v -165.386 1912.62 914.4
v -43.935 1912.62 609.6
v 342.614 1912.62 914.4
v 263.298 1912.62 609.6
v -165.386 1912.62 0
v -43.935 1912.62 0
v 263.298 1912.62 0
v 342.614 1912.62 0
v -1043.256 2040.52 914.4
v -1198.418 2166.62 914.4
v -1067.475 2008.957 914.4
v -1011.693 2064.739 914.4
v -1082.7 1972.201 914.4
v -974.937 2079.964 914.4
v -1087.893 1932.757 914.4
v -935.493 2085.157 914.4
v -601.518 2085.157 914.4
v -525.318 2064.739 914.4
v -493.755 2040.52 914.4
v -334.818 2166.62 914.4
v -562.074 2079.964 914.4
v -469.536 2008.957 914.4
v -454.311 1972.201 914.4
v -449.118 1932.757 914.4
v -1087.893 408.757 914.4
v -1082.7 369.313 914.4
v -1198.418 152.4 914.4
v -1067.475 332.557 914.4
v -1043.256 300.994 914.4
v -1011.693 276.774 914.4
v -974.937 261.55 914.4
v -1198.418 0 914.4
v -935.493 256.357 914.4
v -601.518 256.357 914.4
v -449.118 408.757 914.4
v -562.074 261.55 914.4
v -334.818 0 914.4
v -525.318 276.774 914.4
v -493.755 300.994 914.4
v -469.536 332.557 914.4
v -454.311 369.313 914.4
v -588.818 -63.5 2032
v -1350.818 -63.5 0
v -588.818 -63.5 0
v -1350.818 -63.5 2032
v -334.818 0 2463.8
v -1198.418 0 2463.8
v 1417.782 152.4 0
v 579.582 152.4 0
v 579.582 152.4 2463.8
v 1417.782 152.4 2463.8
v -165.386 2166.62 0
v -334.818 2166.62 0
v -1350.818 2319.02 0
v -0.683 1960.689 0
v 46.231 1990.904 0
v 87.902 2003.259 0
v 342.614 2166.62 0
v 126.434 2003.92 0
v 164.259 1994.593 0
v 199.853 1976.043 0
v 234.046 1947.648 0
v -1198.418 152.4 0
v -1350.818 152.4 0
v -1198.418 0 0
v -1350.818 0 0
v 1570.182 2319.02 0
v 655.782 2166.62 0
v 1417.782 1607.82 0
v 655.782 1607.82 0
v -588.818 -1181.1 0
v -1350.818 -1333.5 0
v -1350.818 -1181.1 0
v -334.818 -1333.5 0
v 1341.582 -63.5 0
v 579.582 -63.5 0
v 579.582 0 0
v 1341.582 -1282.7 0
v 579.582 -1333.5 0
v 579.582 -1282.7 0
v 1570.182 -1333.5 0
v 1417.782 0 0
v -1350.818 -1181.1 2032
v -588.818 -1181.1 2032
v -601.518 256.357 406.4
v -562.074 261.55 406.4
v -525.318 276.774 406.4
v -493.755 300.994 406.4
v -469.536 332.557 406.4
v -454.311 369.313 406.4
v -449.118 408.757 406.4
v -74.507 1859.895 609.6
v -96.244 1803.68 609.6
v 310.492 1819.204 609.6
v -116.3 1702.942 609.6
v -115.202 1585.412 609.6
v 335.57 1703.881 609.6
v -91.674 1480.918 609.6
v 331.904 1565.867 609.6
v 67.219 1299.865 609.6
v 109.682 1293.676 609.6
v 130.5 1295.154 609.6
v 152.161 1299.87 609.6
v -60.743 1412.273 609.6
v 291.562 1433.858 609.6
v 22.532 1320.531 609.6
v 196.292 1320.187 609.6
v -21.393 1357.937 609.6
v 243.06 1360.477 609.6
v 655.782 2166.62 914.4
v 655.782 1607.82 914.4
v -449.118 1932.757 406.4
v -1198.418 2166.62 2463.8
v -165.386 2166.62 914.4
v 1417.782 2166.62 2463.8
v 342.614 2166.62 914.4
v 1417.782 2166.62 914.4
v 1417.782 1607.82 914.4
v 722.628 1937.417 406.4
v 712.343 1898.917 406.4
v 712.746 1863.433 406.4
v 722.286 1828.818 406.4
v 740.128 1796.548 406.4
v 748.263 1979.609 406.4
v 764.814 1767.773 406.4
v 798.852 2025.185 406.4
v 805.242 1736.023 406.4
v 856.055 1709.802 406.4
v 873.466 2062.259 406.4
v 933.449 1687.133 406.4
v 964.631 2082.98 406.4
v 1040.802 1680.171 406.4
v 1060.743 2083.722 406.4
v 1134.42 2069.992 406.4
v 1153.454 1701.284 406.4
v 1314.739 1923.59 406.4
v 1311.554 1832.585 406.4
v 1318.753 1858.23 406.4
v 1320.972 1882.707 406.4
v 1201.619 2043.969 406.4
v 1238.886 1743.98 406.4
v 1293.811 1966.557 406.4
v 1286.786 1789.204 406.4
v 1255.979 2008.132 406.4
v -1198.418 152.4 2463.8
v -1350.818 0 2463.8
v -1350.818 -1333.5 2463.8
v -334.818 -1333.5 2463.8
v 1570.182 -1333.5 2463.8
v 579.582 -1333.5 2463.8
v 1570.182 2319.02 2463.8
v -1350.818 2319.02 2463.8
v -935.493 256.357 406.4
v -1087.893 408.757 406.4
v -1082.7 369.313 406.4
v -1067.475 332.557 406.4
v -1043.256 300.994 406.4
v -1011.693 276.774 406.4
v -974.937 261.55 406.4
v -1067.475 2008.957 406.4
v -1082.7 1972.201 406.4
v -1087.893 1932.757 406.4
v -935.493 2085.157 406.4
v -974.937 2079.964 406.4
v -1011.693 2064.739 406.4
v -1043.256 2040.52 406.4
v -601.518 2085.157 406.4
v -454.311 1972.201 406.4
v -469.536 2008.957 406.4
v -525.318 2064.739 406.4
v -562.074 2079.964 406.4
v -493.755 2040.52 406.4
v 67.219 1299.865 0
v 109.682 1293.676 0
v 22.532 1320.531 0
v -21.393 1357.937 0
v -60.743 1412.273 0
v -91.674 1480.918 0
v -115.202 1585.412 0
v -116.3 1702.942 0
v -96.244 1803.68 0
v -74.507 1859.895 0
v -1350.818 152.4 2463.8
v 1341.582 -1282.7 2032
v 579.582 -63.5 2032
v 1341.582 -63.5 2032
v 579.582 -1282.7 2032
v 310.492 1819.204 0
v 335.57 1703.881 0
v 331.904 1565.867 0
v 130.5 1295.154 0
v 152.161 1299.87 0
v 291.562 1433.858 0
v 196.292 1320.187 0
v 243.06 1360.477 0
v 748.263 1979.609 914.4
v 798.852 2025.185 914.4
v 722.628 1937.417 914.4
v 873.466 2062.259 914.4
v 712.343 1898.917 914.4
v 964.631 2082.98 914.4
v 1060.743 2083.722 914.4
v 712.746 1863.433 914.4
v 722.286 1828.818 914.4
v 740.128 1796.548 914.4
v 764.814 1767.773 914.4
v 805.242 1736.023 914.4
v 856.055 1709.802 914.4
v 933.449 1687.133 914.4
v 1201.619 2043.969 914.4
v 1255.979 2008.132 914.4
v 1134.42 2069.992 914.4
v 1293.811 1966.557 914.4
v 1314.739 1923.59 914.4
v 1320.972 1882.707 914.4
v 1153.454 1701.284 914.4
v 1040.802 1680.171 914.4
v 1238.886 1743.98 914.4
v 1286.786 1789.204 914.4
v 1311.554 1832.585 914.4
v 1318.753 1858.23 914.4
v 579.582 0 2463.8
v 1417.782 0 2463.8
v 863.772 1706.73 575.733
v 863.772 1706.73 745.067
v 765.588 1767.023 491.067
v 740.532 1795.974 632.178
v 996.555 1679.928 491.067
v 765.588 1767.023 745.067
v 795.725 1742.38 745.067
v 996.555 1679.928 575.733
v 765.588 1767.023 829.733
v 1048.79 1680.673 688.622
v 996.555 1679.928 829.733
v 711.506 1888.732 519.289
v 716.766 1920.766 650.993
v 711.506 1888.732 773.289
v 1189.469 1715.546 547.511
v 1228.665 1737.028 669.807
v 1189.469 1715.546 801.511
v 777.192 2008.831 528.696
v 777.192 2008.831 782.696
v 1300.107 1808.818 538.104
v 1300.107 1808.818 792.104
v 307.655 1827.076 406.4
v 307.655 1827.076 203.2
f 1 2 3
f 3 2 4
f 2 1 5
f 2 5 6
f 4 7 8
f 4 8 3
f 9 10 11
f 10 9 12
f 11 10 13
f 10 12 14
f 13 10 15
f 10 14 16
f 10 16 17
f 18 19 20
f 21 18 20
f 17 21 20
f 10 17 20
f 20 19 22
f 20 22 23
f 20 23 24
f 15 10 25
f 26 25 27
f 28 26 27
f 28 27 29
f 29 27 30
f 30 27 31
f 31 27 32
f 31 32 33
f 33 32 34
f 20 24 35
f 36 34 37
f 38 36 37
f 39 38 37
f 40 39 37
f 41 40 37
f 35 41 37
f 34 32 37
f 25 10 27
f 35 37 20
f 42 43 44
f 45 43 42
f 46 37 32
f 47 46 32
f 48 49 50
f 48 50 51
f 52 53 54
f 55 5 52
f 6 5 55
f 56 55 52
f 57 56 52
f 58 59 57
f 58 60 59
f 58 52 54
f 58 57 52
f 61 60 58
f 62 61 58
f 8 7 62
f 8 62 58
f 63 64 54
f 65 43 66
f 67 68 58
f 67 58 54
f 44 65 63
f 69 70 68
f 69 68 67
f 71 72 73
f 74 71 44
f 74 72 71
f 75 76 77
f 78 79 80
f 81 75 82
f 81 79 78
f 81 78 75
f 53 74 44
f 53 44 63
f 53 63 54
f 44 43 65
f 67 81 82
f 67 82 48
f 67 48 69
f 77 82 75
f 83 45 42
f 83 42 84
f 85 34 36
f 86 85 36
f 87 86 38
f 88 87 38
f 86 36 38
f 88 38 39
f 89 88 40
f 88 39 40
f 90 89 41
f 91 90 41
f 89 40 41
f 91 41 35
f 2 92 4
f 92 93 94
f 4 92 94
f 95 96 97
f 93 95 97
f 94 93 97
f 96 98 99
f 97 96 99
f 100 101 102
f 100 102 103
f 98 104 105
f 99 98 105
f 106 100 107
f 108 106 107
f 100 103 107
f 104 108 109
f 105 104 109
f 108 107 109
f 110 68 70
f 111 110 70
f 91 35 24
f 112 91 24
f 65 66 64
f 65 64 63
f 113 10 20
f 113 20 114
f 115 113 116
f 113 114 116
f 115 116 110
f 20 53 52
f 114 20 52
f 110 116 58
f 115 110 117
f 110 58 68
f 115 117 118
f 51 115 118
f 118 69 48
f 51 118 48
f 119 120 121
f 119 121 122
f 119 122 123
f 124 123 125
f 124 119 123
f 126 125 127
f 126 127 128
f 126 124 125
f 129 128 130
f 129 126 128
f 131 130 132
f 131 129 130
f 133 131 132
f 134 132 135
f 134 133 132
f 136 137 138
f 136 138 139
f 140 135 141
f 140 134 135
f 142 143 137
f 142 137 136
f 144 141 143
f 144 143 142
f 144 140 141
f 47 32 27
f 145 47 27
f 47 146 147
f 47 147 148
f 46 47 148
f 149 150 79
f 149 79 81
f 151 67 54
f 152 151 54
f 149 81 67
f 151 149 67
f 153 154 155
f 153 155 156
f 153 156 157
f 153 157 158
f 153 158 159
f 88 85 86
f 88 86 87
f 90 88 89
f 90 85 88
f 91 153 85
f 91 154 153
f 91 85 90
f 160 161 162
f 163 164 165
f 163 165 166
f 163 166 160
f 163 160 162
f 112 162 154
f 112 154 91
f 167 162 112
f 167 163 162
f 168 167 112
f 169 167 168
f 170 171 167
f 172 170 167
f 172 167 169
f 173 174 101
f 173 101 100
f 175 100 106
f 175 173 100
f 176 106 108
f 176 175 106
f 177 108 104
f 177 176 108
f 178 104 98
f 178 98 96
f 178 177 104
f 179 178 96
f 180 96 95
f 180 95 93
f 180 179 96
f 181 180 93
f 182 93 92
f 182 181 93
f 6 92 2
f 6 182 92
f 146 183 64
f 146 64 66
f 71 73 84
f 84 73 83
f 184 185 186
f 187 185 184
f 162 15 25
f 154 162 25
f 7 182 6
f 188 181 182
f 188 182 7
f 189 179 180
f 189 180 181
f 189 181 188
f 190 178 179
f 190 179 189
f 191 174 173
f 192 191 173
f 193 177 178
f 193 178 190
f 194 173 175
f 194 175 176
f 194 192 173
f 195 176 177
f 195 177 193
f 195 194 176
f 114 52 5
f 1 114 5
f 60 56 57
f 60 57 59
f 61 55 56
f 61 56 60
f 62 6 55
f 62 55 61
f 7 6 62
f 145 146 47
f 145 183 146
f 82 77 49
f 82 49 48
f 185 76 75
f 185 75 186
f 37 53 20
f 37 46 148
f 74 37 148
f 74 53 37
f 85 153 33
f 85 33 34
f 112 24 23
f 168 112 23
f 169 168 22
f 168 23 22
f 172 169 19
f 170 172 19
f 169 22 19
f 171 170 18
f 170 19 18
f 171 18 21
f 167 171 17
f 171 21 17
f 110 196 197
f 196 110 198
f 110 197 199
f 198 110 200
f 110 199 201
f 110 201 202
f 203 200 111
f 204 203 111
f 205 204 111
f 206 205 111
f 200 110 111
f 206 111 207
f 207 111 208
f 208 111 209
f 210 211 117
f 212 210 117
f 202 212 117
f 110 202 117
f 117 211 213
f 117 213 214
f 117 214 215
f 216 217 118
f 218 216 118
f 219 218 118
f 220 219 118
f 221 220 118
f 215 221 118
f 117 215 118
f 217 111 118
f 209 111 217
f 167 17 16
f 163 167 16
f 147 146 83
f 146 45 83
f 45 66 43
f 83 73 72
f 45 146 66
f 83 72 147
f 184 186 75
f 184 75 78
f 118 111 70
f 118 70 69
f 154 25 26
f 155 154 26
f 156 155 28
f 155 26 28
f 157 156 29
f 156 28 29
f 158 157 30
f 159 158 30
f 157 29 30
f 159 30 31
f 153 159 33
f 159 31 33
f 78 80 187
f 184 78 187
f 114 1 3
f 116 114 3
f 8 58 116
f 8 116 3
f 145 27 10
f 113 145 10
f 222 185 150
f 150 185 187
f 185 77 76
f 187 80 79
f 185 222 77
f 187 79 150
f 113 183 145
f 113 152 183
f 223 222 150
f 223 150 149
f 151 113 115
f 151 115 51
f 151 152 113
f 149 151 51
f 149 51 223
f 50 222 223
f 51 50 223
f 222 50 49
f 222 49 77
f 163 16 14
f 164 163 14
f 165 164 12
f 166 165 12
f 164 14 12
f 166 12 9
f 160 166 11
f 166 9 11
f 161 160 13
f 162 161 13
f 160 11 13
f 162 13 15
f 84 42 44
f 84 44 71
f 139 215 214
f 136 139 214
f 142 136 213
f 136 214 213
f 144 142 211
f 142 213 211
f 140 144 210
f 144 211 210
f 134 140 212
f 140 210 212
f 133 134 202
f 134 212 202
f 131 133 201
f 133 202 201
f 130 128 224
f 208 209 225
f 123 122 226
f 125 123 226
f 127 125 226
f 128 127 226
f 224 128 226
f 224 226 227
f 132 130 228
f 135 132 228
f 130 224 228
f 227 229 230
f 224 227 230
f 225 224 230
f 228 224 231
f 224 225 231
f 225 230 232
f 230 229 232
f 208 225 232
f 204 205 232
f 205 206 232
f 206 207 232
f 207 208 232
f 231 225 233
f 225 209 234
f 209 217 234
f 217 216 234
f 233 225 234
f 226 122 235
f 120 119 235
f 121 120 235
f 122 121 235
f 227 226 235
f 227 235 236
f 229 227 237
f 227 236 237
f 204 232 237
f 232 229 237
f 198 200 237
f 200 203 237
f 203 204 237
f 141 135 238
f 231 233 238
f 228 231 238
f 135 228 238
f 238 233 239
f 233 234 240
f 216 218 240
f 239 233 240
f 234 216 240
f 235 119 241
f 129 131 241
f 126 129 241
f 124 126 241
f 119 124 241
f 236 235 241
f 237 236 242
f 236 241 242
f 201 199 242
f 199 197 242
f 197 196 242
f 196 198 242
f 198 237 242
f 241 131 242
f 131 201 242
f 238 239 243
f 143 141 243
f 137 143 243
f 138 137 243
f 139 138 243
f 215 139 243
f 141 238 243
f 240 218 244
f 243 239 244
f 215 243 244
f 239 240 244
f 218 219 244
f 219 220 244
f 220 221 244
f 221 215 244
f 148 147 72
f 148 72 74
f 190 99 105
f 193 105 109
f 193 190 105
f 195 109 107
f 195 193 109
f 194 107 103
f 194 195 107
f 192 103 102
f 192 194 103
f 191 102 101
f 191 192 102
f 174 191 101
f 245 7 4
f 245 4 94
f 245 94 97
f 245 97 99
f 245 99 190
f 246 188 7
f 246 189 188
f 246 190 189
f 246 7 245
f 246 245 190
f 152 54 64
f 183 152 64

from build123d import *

# Parameters (mm, degrees)
F1_DEPTH  = 2463.8
F2_W      = 1117.6
F2_H      = 2032
F3_DEPTH  = 762
F4_W      = 1219.2
F4_H      = 2032
F5_DEPTH  = 762
F6_W      = 762
F6_H      = 558.8
F6_W_2    = 863.6
F6_H_2    = 2166.62
F6_W_3    = 508
F6_H_3    = 254
F7_DEPTH  = 914.4
F9_DEPTH  = 609.6
F11_DEPTH = 508
F12_W     = 838.2
F12_H     = 152.4
F12_W_2   = 152.4
F13_DEPTH = 2463.8


with BuildPart() as f1:
    # F0 (on Top) → F1 (new body)
    with BuildSketch(Plane.XY):
        Polygon((-334.8183358609, 0), (-1198.4183358609, 0), (-1198.4183358609, 2166.62), (1417.7816641391, 2166.62), (1417.7816641391, 0), (579.5816641391, 0), (579.5816641391, -1333.5), (1570.1816641391, -1333.5), (1570.1816641391, 0), (1570.1816641391, 2319.02), (-1350.8183358609, 2319.02), (-1350.8183358609, 0), (-1350.8183358609, -1333.5), (-334.8183358609, -1333.5), align=None)
    extrude(amount=F1_DEPTH)

    # F2 (on face) → F3 (cut)
    with BuildSketch(Plane(origin=(-1350.8183358609, 0, 0), x_dir=(0, -1, 0), z_dir=(-1, 0, 0))):
        with Locations((622.3, 1016)):
            Rectangle(F2_W, F2_H)
    extrude(amount=-F3_DEPTH, mode=Mode.SUBTRACT)

    # F4 (on face) → F5 (cut)
    with BuildSketch(Plane(origin=(579.5816641391, 0, 0), x_dir=(0, -1, 0), z_dir=(-1, 0, 0))):
        with Locations((673.1, 1016)):
            Rectangle(F4_W, F4_H)
    extrude(amount=-F5_DEPTH, mode=Mode.SUBTRACT)

    # F6 (on face) → F7 (join)
    with BuildSketch(Plane(origin=(0, 0, 0), x_dir=(1, 0, 0), z_dir=(0, 0, -1))):
        with Locations((1036.7816641391, -1887.22)):
            Rectangle(F6_W, F6_H)
        with Locations((-766.6183358609, -1083.31)):
            Rectangle(F6_W_2, F6_H_2)
        with Locations((88.6141725779, -2039.62)):
            Rectangle(F6_W_3, F6_H_3)
    extrude(amount=-F7_DEPTH)

    # F8 (on face) → F9 (join)
    with BuildSketch(Plane(origin=(0, 0, 0), x_dir=(1, 0, 0), z_dir=(0, 0, -1))):
        with BuildLine():
            add(Edge.make_bspline(
                [(109.6816062927, -1293.6762565613), (-286.2652083175, -1293.6762565613), (-88.2918010124, -1827.0762565613), (109.6816062927, -2360.4762565613), (307.6550135978, -1827.0762565613), (505.628420903, -1293.6762565613), (109.6816062927, -1293.6762565613)],
                knots=[0, 0, 0, 2.0943951024, 2.0943951024, 4.1887902048, 4.1887902048, 6.2831853072, 6.2831853072, 6.2831853072], degree=2, weights=[1, 0.5, 1, 0.5, 1, 0.5, 1]))
        make_face()
    extrude(amount=-F9_DEPTH)

    # F10 (on face) → F11 (cut)
    with BuildSketch(Plane.XY.offset(914.4)):
        with BuildLine():
            Line((-601.5183358609, 2085.1567547083), (-935.4930091858, 2085.1567547083))
            ThreePointArc((-935.4930091858, 2085.1567547083), (-1043.2560826386, 2040.5198281611), (-1087.8930091858, 1932.7567547083))
            Line((-1087.8930091858, 1932.7567547083), (-1087.8930091858, 408.7567547083))
            ThreePointArc((-1087.8930091858, 408.7567547083), (-1043.2560826386, 300.9936812555), (-935.4930091858, 256.3567547083))
            Line((-935.4930091858, 256.3567547083), (-601.5183358609, 256.3567547083))
            ThreePointArc((-601.5183358609, 256.3567547083), (-493.755262408, 300.9936812555), (-449.1183358609, 408.7567547083))
            Line((-449.1183358609, 408.7567547083), (-449.1183358609, 1932.7567547083))
            ThreePointArc((-449.1183358609, 1932.7567547083), (-493.755262408, 2040.5198281611), (-601.5183358609, 2085.1567547083))
        make_face()
        with BuildLine():
            add(Edge.make_bspline(
                [(1320.9720514297, 1882.7065229416), (1320.9720514297, 2234.6592470396), (863.7720514297, 2058.6828849906), (406.5720514297, 1882.7065229416), (863.7720514297, 1706.7301608926), (1320.9720514297, 1530.7537988436), (1320.9720514297, 1882.7065229416)],
                knots=[0, 0, 0, 2.0943951024, 2.0943951024, 4.1887902048, 4.1887902048, 6.2831853072, 6.2831853072, 6.2831853072], degree=2, weights=[1, 0.5, 1, 0.5, 1, 0.5, 1]))
        make_face()
    extrude(amount=-F11_DEPTH, mode=Mode.SUBTRACT)

    # F12 (on face) → F13 (join, through all)
    with BuildSketch(Plane(origin=(0, 0, 0), x_dir=(1, 0, 0), z_dir=(0, 0, -1))):
        with Locations((998.6816641391, -76.2)):
            Rectangle(F12_W, F12_H)
        with Locations((-1274.6183358609, -76.2)):
            Rectangle(F12_W_2, F12_H)
    extrude(amount=-F13_DEPTH)


solid = f1.part
